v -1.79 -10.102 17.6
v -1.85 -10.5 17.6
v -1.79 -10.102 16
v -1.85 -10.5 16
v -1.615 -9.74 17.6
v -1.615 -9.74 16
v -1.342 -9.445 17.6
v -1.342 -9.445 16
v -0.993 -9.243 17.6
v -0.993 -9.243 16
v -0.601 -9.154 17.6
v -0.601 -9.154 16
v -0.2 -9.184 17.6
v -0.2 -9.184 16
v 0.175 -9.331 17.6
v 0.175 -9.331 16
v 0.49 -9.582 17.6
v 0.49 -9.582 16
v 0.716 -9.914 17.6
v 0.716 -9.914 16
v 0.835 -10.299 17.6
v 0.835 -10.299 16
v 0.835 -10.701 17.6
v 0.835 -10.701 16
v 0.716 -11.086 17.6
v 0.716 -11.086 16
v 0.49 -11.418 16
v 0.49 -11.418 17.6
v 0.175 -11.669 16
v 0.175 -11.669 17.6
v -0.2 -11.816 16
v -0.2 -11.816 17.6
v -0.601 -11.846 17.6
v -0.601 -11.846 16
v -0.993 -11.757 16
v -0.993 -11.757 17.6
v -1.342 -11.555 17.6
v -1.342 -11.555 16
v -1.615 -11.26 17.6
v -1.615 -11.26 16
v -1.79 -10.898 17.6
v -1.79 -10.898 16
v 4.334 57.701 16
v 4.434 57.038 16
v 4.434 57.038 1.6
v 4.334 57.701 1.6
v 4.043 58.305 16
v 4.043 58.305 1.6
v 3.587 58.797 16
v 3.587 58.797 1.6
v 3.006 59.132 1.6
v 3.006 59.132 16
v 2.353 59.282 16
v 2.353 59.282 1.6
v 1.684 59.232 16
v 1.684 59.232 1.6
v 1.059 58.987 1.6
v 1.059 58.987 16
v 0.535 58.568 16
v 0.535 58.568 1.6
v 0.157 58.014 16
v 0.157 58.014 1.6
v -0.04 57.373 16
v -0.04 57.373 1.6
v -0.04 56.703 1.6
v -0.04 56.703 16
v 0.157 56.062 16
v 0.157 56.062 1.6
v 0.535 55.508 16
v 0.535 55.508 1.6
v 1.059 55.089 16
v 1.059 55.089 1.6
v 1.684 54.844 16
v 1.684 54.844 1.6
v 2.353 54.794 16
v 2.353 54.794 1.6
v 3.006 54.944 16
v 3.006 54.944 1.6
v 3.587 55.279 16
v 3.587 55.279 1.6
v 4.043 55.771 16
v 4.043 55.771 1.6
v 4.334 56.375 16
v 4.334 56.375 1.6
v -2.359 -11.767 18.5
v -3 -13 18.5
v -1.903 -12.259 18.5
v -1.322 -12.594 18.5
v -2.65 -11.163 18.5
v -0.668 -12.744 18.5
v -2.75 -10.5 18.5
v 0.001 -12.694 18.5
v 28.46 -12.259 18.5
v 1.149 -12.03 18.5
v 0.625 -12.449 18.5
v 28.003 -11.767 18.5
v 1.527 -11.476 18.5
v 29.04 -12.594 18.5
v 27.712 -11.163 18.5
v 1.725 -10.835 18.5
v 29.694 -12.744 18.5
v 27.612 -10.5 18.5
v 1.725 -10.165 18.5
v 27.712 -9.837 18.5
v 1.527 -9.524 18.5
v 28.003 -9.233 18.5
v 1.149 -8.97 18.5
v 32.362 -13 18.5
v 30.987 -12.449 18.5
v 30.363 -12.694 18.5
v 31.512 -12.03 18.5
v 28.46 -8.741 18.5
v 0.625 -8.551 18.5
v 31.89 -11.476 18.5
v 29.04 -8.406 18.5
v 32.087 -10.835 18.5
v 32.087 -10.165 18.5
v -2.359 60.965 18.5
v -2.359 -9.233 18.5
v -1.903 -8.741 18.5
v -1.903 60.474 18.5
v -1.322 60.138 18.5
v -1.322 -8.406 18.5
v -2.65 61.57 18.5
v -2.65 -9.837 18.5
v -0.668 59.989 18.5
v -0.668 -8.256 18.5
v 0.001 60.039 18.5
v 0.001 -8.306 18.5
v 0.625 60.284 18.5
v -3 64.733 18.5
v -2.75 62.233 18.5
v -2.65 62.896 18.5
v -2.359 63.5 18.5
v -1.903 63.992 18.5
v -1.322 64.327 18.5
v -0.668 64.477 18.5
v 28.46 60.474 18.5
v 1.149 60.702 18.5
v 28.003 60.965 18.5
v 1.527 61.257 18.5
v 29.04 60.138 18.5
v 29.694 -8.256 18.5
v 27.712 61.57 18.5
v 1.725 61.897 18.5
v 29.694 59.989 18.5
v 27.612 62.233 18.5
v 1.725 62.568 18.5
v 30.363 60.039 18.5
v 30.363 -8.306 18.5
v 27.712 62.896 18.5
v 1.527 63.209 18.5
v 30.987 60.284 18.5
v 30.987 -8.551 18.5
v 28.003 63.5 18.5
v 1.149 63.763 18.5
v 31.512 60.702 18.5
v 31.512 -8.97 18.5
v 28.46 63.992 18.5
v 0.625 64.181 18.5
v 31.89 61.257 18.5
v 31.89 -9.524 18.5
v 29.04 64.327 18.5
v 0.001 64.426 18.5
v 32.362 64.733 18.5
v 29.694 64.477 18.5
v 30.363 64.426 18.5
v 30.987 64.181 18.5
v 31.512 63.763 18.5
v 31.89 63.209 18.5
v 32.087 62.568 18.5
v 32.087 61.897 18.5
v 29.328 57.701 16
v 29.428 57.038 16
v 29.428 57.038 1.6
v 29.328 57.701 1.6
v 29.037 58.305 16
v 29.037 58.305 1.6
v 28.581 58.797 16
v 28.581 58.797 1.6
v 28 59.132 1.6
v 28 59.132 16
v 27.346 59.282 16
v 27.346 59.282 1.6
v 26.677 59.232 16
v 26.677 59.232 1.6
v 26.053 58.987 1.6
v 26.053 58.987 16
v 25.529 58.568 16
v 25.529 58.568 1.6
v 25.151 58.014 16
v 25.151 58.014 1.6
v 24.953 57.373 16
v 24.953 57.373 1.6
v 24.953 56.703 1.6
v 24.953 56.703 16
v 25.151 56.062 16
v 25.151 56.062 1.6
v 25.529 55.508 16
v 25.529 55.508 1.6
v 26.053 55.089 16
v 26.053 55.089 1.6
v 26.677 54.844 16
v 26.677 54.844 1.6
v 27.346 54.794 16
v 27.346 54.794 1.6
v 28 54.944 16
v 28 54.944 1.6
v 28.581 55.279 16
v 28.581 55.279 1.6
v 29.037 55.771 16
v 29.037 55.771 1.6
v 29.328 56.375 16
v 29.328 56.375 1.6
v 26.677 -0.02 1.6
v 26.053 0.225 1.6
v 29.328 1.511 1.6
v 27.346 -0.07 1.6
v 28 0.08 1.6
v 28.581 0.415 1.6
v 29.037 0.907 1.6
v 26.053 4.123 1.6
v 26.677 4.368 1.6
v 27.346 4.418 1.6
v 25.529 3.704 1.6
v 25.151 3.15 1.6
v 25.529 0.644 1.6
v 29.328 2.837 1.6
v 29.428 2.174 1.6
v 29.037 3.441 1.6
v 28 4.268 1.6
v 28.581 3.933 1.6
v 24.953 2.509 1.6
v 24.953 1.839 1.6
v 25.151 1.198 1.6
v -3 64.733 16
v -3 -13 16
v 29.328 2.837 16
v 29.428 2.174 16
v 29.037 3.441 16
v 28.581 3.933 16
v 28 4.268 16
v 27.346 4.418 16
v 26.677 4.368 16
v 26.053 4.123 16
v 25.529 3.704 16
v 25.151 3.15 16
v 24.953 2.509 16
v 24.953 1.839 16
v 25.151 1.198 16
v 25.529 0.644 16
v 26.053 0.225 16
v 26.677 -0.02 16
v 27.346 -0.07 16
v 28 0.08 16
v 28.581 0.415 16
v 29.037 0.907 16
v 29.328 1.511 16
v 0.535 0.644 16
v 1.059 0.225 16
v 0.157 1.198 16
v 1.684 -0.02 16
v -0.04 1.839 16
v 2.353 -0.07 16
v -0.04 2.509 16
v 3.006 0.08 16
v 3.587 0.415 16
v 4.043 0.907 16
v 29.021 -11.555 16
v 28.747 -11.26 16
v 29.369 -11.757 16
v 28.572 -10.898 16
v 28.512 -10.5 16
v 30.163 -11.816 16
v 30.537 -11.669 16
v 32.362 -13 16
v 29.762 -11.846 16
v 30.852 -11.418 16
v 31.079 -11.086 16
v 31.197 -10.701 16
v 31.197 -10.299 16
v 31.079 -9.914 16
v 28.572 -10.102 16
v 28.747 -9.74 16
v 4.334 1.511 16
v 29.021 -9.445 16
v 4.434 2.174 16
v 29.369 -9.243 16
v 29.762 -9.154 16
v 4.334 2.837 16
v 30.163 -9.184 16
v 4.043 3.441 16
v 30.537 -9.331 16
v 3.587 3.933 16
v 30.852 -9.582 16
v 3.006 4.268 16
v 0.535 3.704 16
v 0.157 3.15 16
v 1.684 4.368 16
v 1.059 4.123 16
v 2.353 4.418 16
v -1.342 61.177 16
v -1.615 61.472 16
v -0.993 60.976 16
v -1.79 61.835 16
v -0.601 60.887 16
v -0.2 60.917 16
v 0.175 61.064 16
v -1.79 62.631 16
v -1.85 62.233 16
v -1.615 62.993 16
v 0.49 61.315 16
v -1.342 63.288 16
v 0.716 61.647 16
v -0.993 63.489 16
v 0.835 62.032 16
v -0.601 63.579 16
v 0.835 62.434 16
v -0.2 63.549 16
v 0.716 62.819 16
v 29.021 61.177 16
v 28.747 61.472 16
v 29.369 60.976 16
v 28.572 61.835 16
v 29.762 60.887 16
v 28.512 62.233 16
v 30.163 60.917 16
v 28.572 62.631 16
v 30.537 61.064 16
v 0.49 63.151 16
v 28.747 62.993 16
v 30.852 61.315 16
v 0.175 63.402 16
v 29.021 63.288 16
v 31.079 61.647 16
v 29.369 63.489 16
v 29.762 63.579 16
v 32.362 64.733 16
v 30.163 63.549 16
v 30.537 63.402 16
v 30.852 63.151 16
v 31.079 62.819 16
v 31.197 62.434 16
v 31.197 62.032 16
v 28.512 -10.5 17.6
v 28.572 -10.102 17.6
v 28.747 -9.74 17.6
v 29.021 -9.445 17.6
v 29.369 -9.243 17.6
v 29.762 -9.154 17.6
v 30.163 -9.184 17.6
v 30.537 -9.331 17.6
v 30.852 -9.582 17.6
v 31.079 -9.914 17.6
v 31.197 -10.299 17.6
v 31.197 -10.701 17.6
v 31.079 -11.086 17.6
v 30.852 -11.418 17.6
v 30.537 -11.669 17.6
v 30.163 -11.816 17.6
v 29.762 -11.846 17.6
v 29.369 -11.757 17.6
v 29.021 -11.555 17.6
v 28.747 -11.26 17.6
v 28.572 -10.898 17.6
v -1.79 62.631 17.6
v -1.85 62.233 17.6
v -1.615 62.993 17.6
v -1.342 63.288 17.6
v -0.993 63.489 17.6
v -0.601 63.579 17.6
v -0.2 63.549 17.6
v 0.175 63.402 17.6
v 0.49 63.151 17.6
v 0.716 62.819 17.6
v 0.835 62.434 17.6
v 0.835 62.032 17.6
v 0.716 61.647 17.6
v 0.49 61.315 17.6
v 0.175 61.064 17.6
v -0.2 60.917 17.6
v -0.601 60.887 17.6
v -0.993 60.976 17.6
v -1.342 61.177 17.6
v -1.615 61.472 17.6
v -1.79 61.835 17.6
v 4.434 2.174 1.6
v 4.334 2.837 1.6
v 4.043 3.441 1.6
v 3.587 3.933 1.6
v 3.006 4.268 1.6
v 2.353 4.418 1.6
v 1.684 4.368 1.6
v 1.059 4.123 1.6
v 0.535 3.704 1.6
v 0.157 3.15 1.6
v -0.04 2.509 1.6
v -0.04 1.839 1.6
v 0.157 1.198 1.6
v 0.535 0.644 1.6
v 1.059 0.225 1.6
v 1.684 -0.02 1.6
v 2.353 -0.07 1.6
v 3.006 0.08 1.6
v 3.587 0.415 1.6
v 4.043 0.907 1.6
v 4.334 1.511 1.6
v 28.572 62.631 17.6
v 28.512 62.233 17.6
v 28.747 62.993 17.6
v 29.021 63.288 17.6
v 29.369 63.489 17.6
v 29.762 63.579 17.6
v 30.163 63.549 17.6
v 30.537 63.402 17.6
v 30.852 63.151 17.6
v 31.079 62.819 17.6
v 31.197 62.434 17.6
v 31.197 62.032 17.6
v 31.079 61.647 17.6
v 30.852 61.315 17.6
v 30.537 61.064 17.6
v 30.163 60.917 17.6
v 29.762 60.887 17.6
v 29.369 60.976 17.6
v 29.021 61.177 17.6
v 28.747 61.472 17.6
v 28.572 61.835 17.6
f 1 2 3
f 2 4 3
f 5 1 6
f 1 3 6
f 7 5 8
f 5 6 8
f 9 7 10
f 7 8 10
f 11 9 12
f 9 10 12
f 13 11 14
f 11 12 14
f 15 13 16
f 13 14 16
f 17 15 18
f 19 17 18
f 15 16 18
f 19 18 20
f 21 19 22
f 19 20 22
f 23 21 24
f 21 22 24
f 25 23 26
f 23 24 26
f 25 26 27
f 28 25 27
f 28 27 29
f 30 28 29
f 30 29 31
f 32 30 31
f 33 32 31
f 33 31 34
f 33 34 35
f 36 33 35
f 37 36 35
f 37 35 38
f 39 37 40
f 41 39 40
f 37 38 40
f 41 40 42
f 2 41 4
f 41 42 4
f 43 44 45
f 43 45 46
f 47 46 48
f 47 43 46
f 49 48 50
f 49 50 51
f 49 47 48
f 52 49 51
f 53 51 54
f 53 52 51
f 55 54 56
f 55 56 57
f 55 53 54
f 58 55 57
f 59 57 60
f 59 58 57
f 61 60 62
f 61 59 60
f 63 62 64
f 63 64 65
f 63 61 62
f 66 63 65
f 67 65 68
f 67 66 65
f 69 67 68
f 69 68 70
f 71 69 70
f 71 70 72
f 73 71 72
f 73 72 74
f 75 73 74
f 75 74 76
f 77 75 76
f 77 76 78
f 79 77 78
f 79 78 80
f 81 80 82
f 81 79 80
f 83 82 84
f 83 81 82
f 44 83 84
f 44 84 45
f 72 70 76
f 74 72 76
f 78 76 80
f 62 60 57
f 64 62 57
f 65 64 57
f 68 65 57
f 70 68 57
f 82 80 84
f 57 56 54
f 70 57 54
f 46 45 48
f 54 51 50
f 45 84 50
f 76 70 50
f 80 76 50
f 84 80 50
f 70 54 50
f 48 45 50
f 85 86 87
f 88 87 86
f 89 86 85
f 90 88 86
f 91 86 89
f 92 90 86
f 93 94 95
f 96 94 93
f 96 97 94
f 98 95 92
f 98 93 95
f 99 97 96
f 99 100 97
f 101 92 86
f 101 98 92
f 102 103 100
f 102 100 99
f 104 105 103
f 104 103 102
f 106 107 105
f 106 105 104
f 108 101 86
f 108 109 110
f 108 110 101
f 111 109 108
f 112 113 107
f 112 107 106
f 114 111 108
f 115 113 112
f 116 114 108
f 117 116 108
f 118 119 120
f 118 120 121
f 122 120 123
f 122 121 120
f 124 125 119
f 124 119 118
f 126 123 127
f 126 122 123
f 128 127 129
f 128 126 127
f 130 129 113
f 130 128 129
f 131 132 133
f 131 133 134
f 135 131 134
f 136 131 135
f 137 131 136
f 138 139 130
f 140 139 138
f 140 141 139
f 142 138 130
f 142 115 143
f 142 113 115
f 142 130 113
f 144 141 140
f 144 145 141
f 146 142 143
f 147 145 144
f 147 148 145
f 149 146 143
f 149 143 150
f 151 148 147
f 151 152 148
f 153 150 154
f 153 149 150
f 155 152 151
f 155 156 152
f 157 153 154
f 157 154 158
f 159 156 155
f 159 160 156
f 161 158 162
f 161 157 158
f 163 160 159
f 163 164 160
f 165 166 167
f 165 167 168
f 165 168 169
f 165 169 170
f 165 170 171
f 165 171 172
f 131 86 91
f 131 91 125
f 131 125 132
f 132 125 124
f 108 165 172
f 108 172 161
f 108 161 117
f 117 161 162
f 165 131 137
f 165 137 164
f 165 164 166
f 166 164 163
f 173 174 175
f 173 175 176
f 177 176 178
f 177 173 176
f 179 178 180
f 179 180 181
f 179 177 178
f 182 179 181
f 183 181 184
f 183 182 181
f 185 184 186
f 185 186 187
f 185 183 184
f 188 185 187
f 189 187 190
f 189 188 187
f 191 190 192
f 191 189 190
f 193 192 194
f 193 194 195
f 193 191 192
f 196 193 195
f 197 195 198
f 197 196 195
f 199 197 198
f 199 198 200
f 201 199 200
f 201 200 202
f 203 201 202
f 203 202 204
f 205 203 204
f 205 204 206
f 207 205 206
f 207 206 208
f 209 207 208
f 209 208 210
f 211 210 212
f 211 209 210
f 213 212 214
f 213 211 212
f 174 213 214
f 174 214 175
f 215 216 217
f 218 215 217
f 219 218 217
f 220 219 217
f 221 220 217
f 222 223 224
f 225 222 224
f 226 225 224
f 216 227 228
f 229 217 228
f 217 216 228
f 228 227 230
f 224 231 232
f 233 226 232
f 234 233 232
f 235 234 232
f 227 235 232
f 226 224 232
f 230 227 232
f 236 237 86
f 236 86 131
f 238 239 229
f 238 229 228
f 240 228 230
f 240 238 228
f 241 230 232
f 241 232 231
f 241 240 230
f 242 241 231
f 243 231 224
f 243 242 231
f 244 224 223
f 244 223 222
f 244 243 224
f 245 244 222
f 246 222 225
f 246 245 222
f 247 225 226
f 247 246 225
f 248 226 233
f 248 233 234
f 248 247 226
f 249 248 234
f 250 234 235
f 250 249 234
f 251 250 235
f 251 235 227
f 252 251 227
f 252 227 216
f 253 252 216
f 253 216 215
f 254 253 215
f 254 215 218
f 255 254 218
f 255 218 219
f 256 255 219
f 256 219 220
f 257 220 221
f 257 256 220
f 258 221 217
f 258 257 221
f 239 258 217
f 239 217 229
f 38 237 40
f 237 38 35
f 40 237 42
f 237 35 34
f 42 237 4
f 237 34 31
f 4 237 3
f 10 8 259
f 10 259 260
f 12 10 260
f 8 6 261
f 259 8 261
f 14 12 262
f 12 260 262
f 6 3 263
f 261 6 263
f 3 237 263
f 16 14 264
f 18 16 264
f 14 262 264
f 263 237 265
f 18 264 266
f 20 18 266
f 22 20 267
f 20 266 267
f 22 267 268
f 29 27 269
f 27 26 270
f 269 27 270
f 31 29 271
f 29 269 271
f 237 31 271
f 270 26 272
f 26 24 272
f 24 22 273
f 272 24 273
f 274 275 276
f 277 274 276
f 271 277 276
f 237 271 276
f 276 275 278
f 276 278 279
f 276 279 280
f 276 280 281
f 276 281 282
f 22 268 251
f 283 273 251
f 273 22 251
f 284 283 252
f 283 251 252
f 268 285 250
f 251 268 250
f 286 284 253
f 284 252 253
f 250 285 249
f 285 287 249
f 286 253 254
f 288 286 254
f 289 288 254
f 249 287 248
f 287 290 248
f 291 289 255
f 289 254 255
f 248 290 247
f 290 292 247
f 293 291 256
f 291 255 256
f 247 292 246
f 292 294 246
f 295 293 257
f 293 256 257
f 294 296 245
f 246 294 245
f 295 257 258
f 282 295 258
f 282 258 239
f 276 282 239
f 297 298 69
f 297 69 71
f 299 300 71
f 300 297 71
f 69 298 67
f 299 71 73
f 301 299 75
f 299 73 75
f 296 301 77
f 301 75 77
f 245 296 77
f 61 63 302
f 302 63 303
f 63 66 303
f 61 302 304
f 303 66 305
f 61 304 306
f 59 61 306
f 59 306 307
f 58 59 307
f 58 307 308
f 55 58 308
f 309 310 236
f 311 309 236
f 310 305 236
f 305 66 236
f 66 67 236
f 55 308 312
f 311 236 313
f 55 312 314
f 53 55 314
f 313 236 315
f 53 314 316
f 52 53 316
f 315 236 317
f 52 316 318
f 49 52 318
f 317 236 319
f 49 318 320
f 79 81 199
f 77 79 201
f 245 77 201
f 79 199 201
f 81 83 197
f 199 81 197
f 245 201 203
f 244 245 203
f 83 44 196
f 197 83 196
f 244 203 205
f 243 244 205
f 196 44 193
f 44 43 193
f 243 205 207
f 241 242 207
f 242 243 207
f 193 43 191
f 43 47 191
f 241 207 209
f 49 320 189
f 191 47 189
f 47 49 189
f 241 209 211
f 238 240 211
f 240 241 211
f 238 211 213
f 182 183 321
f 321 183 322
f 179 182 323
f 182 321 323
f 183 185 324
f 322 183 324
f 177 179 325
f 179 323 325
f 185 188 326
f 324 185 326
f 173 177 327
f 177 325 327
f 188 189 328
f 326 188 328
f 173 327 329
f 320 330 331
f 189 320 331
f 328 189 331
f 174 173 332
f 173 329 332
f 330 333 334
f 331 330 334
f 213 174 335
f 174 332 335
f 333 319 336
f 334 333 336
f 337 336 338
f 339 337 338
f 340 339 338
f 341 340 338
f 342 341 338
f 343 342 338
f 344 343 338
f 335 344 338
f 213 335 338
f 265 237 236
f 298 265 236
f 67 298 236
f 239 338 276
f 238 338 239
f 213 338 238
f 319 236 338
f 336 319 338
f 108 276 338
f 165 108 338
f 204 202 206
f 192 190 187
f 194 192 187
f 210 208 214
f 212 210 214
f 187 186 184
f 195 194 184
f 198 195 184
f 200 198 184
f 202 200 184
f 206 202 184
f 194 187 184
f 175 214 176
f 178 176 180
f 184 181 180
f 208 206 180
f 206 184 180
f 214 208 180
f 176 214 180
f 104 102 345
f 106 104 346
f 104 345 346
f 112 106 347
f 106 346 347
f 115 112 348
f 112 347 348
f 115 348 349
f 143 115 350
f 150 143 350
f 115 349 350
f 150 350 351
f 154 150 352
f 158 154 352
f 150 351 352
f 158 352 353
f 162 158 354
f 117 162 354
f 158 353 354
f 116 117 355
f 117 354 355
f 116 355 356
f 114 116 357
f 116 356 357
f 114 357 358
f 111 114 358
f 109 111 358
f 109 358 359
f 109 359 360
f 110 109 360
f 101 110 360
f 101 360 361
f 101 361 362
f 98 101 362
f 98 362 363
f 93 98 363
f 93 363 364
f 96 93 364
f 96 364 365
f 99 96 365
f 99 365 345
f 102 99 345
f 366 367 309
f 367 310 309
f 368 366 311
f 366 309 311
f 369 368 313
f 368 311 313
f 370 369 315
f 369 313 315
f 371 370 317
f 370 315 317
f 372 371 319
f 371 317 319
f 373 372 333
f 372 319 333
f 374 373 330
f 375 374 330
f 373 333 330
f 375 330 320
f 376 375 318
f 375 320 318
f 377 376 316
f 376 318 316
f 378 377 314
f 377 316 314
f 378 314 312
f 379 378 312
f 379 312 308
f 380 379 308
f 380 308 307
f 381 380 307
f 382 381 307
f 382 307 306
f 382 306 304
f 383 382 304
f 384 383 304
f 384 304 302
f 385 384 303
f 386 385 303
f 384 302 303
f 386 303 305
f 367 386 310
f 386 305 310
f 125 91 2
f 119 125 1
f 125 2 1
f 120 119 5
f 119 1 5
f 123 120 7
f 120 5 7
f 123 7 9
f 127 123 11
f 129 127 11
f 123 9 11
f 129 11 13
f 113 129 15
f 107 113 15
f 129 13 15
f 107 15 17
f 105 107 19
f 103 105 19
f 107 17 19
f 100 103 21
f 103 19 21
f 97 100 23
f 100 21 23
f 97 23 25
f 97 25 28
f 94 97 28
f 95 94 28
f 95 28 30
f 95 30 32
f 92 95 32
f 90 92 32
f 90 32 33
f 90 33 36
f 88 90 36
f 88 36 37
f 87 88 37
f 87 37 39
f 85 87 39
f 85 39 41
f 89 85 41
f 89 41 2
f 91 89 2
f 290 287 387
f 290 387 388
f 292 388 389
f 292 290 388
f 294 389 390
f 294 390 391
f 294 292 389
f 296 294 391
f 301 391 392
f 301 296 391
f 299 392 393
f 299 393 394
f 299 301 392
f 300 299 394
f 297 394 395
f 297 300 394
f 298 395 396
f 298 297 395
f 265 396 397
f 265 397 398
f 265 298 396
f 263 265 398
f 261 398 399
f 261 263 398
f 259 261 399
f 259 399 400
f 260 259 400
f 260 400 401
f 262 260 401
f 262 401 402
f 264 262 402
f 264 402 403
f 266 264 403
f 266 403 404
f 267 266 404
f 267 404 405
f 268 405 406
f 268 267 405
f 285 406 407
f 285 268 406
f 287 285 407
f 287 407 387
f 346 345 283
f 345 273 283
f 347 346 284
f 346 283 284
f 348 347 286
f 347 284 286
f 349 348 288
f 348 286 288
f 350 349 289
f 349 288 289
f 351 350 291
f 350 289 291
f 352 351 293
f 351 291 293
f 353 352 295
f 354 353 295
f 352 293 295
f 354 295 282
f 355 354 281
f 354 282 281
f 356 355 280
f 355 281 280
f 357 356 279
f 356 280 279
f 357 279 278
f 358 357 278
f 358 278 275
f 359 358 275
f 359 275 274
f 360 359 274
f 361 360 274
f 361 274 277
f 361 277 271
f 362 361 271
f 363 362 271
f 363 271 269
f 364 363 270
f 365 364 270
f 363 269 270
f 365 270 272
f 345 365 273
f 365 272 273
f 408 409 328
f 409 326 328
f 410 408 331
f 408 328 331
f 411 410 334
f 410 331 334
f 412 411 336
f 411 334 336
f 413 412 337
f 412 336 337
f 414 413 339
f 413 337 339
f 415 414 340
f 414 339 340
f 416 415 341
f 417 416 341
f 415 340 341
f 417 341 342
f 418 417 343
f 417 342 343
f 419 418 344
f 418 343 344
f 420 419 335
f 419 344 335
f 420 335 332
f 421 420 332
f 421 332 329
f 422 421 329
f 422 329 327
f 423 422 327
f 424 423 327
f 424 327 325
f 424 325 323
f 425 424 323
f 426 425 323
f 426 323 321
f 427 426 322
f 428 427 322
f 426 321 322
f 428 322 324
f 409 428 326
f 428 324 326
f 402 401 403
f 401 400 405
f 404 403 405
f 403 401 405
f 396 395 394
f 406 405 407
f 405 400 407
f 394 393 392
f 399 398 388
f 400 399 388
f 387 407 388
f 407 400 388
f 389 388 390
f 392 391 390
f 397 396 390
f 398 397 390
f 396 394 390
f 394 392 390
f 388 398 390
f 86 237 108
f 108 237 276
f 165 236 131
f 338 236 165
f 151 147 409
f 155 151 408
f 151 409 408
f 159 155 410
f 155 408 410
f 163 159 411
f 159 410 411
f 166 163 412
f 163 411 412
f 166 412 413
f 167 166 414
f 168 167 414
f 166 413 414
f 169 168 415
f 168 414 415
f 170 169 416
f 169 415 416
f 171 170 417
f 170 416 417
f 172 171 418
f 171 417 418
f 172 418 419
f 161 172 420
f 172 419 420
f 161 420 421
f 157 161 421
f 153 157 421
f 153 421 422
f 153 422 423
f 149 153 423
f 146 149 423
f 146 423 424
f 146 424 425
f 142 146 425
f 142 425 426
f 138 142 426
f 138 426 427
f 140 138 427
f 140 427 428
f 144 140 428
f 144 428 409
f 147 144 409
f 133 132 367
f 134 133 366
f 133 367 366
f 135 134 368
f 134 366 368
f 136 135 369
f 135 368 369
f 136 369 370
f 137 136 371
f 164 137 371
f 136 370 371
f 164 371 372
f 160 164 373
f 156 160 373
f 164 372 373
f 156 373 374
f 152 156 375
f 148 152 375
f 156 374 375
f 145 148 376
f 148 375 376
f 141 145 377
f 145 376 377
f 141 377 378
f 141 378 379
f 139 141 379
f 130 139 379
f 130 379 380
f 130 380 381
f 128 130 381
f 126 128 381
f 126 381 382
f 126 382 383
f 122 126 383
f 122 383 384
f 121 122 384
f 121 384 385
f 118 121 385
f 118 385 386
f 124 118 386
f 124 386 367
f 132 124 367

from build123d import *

# Parameters (mm, degrees)
SKETCH009_W      = 35.3624
SKETCH009_H      = 77.7328
PAD004_DEPTH     = 2.5
SKETCH010_R      = 2.25
PAD005_DEPTH     = 14.4
HOLE_D           = 2.7
HOLE_CSINK_D     = 4.5
HOLE_CSINK_ANGLE = 90


with BuildPart() as part:
    # Sketch009 (on CopyDatumPlane) → Pad004 (new body)
    with BuildSketch(Plane.XY.offset(16)):
        with Locations((14.6812, 25.8664)):
            Rectangle(SKETCH009_W, SKETCH009_H)
    extrude(amount=PAD004_DEPTH)

    # Sketch010 (on CopyDatumPlane) → Pad005 (join)
    with BuildSketch(Plane.XY.offset(16)):
        with Locations((2.1844, 57.038)):
            Circle(SKETCH010_R)
        with Locations((27.178, 57.038)):
            Circle(SKETCH010_R)
        with Locations((27.178, 2.174)):
            Circle(SKETCH010_R)
        with Locations((2.1844, 2.174)):
            Circle(SKETCH010_R)
    extrude(amount=-PAD005_DEPTH)

    # Hole (through all)
    with Locations(Plane.XY.offset(18.5)):
        with Locations((-0.5, 62.2328), (29.8624, 62.2328), (29.8624, -10.5), (-0.5, -10.5)):
            CounterSinkHole(HOLE_D / 2, HOLE_CSINK_D / 2, counter_sink_angle=HOLE_CSINK_ANGLE)


solid = part.part
